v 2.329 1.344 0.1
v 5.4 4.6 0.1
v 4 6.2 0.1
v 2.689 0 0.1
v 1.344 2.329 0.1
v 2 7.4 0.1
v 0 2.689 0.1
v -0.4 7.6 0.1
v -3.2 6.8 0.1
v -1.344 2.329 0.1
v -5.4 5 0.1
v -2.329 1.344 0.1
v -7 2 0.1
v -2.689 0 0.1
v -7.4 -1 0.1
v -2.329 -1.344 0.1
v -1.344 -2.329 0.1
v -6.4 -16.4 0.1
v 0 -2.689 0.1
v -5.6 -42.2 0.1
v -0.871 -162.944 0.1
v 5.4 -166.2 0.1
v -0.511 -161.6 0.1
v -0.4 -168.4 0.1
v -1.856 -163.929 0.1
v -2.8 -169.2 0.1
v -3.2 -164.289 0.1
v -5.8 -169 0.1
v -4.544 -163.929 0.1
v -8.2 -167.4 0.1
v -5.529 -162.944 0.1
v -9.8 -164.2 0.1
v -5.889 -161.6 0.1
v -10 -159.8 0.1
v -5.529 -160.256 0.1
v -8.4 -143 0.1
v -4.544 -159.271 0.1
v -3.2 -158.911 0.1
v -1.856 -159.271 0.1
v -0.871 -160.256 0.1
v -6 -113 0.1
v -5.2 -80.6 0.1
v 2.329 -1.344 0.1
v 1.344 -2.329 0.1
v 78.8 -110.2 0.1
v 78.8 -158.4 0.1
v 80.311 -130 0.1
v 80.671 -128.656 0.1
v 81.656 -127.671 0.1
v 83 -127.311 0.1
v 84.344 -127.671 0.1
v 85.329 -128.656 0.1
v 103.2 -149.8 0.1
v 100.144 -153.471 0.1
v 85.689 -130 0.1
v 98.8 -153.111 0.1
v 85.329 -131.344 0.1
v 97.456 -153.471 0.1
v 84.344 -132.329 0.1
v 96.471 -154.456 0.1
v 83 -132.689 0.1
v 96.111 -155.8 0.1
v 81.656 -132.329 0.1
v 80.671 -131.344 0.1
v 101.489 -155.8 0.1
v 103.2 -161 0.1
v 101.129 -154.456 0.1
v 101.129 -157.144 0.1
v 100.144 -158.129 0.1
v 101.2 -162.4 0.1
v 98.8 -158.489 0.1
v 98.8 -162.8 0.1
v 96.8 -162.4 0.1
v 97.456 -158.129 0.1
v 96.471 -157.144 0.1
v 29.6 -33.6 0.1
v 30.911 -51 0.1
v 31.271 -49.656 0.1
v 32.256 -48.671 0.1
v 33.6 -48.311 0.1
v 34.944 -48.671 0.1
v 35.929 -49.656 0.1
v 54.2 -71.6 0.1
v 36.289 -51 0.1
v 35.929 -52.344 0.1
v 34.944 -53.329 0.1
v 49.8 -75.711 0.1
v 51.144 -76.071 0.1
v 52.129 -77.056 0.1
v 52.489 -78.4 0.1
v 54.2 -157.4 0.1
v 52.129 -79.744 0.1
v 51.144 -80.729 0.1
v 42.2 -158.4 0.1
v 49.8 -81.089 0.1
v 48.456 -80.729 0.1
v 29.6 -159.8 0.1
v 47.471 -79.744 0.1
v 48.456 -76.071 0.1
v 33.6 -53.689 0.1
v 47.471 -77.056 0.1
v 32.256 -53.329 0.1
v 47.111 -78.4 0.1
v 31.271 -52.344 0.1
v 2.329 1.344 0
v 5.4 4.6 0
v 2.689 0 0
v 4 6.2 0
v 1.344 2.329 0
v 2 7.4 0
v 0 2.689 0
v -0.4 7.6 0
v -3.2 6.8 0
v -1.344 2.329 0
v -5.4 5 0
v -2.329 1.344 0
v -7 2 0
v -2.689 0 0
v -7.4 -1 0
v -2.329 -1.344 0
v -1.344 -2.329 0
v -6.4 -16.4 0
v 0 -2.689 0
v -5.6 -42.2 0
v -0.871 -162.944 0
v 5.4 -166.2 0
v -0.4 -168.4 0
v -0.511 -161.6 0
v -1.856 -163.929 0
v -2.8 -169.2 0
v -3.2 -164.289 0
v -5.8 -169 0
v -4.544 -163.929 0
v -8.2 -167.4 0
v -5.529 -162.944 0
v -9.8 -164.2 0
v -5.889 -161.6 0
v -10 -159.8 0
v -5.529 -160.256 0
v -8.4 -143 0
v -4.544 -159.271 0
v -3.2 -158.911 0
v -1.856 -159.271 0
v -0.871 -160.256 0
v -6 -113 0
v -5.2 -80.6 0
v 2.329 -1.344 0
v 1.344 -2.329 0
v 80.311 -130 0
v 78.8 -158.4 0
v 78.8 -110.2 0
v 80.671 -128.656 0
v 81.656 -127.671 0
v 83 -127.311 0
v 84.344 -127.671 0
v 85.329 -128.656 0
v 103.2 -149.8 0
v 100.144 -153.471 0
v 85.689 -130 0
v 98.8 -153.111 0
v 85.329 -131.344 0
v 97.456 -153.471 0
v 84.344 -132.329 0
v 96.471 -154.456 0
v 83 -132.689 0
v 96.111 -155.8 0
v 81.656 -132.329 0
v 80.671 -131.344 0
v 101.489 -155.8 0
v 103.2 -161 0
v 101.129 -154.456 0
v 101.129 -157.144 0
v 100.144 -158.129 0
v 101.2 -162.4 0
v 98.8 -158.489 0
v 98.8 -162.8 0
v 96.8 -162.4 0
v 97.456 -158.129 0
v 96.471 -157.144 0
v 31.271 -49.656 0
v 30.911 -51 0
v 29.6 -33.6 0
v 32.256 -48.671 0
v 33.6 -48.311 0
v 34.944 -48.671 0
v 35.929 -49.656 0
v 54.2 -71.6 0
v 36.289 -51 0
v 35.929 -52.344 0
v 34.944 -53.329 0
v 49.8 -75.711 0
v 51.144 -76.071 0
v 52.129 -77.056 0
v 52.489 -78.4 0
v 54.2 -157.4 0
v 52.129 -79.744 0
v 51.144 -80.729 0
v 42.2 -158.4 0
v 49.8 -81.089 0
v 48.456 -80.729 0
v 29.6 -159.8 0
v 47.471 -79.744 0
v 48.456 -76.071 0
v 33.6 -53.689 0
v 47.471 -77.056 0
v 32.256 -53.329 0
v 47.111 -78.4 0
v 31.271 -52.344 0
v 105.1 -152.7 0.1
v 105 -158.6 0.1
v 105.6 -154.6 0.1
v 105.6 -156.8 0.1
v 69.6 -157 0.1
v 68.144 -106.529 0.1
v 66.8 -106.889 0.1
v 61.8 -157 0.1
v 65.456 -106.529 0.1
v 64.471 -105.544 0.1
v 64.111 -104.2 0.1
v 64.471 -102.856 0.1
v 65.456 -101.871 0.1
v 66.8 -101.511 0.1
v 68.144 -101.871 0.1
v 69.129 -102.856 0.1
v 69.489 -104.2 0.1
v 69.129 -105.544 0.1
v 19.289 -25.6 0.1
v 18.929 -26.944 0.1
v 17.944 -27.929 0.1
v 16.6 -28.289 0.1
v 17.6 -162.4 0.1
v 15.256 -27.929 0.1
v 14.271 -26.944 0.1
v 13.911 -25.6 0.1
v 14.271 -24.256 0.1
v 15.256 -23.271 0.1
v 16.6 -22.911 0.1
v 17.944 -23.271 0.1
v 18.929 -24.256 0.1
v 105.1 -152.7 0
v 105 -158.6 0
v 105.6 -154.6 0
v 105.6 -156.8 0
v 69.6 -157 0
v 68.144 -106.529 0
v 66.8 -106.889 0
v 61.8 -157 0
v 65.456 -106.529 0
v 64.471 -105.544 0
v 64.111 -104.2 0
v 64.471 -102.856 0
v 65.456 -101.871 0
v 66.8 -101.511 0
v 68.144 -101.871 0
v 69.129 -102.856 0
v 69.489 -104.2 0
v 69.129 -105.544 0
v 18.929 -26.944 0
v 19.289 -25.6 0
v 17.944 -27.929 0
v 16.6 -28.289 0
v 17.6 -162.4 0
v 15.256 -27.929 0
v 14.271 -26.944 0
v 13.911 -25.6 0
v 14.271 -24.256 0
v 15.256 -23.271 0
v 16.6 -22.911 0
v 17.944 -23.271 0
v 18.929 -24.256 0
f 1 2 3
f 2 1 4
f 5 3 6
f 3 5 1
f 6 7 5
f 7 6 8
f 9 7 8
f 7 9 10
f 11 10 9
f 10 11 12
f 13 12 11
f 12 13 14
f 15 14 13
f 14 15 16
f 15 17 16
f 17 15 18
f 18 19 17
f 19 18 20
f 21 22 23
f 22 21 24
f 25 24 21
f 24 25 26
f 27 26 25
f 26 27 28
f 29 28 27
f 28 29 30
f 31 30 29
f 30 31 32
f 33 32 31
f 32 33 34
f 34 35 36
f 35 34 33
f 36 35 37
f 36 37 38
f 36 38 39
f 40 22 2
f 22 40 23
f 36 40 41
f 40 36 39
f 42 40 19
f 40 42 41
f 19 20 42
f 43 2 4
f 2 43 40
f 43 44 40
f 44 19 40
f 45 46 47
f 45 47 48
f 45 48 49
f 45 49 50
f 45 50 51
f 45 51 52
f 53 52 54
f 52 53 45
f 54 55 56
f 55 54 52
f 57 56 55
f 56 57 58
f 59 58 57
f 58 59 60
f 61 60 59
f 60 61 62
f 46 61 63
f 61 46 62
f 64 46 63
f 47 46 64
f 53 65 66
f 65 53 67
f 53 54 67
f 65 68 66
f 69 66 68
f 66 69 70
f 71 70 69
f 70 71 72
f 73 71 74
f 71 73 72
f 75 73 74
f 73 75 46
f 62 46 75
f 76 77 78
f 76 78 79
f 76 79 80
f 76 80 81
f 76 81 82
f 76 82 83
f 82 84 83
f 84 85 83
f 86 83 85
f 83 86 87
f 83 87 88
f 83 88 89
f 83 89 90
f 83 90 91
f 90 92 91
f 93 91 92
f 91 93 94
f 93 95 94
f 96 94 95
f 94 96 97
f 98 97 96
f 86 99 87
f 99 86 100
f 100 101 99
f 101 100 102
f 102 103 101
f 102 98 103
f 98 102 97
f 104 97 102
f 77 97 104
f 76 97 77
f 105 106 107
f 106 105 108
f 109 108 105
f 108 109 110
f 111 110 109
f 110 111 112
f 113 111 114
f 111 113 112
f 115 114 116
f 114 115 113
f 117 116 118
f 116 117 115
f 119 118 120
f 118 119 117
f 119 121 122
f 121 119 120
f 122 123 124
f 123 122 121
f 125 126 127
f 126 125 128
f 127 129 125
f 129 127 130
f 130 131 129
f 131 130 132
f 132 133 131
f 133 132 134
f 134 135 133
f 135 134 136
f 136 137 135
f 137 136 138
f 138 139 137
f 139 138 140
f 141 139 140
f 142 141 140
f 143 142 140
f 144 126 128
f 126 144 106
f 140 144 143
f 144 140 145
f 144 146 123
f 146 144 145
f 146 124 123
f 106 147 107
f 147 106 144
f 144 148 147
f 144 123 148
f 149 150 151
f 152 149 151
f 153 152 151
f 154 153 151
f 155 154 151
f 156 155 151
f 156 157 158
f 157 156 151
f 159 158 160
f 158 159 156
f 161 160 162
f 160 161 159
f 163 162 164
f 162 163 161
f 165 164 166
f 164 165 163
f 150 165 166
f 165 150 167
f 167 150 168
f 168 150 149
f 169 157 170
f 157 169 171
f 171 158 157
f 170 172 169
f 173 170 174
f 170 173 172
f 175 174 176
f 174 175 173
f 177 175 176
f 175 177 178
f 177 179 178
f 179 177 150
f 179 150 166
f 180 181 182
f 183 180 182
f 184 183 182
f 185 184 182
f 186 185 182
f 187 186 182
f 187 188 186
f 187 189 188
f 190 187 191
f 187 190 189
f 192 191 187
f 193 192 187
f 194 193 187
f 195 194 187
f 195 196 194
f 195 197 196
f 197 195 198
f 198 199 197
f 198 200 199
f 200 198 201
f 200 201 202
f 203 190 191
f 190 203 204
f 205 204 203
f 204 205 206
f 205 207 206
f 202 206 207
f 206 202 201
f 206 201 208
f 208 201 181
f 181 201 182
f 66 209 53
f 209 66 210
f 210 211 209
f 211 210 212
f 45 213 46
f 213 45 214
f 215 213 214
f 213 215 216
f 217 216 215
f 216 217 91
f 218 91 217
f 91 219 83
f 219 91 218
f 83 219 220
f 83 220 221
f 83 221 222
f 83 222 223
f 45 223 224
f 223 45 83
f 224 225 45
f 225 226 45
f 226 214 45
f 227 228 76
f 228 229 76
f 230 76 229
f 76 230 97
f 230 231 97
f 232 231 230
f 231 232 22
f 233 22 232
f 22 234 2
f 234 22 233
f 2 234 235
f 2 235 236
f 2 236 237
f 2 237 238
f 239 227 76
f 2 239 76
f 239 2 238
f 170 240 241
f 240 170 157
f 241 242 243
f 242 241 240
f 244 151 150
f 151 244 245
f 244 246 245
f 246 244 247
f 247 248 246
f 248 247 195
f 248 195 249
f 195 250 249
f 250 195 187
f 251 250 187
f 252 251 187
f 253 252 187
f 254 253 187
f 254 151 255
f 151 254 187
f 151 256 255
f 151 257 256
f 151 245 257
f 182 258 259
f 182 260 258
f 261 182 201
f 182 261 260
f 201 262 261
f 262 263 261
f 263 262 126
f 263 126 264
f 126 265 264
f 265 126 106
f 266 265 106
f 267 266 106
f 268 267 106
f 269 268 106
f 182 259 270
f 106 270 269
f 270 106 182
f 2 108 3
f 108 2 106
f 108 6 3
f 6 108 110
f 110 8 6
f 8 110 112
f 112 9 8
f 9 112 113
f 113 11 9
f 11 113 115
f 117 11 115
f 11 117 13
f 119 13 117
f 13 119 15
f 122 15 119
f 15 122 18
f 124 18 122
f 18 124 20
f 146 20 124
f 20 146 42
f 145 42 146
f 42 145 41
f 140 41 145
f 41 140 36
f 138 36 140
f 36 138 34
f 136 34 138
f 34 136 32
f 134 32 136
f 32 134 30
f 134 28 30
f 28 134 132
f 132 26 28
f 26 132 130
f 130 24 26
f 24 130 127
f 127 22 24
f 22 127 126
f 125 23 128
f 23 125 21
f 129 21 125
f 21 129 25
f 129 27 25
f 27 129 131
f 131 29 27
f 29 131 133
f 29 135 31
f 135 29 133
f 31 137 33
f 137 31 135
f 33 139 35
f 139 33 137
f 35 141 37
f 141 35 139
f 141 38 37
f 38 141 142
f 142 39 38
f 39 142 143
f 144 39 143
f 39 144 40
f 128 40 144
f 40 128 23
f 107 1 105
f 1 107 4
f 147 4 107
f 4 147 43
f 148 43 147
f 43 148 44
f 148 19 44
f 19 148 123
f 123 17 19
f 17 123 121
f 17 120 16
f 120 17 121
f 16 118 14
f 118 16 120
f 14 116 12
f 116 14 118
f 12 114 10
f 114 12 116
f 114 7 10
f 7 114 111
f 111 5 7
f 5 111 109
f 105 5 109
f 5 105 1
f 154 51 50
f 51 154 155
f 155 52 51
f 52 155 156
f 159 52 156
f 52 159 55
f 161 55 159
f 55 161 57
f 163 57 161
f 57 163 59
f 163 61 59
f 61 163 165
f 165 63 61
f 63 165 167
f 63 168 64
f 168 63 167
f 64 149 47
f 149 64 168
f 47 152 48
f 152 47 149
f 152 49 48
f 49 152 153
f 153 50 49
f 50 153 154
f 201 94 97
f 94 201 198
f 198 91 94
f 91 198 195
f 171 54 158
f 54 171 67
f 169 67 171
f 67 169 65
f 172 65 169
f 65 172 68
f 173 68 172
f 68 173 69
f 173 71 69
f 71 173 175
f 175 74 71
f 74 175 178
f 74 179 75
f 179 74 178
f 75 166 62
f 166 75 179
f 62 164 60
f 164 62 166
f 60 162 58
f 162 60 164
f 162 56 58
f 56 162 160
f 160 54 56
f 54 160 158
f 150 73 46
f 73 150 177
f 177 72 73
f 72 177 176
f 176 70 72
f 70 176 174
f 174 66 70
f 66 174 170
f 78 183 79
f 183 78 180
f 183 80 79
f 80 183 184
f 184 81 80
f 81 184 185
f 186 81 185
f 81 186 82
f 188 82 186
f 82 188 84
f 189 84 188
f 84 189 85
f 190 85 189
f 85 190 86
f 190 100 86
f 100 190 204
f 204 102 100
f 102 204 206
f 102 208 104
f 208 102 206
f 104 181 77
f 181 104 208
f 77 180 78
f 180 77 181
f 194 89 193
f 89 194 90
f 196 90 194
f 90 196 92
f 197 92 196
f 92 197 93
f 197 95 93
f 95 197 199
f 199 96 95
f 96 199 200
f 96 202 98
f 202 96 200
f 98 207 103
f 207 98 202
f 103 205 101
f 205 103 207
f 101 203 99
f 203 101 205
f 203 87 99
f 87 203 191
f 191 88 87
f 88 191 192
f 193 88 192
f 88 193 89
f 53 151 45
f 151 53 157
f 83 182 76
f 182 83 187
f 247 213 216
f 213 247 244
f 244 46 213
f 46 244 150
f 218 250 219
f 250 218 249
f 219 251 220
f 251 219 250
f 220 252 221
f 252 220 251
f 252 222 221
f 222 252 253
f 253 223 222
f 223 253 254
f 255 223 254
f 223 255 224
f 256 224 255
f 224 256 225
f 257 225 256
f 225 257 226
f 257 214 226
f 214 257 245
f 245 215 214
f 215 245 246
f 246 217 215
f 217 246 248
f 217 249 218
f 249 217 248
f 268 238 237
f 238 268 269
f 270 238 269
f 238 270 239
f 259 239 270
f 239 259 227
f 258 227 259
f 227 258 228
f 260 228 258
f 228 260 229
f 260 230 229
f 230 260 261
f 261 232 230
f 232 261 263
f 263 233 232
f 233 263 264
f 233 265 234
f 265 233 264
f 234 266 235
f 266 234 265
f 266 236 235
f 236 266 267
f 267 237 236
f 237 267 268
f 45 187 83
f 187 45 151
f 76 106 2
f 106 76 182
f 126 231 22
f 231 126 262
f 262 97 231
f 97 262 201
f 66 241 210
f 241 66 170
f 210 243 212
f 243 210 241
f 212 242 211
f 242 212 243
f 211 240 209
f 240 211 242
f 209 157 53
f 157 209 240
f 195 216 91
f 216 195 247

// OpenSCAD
use <../lib.scad>
use <s/u9496s01.scad>
use <s/u9496s02.scad>
use <s/u9496s03.scad>
use <s/u9496s04.scad>
function ldraw_lib__u9496p01() = [
// 0 Sheet Fabric 15 x 22 Triangular Sail with Thick Stripes on White Background Pattern
// 0 Name: u9496p01.dat
// 0 Author: Philippe Hurbain [Philo]
// 0 !LDRAW_ORG Part UPDATE 2022-03
// 0 !LICENSE Licensed under CC BY 2.0 and CC BY 4.0 : see CAreadme.txt
// 
// 0 BFC CERTIFY CCW
  [0,"BFC","CERTIFY"],
  [0,"BFC","CCW"],
// 
// 0 !CATEGORY Sheet Fabric
// 0 !KEYWORDS Black Seas Barracuda, Caribbean Clipper, set 10040, Set 6274
// 0 !KEYWORDS set 6285, set 6286, Skull's Eye Schooner
// 
// 0 !HISTORY 2022-05-07 [PTadmin] Official Update 2022-03
// 
// 
// 1 16 0 -0.25 0 1 0 0 0 1 0 0 0 1 s\u9496s01.dat
  [1,16,0,-0.25,0,1,0,0,0,1,0,0,0,1, ldraw_lib__s__u9496s01()],
// 1 16 0 0 0 1 0 0 0 -1 0 0 0 1 s\u9496s01.dat
  [1,16,0,0,0,1,0,0,0,-1,0,0,0,1, ldraw_lib__s__u9496s01()],
// 
// 1 15 0 -.25 0 1 0 0 0 1 0 0 0 1 s\u9496s02.dat
  [1,15,0,-.25,0,1,0,0,0,1,0,0,0,1, ldraw_lib__s__u9496s02()],
// 1 15 0 0 0 1 0 0 0 -1 0 0 0 1 s\u9496s02.dat
  [1,15,0,0,0,1,0,0,0,-1,0,0,0,1, ldraw_lib__s__u9496s02()],
// 
// 1 16 0 0 0 1 0 0 0 1 0 0 0 1 s\u9496s03.dat
  [1,16,0,0,0,1,0,0,0,1,0,0,0,1, ldraw_lib__s__u9496s03()],
// 
// 1 15 0 0 0 1 0 0 0 1 0 0 0 1 s\u9496s04.dat
  [1,15,0,0,0,1,0,0,0,1,0,0,0,1, ldraw_lib__s__u9496s04()],
];
module ldraw_lib__u9496p01(step=0, col=false, unit=2/5, alt=false, line=0.2, solid=!$preview)
    makepoly(ldraw_lib__u9496p01(), step=step, col=col, unit=unit, alt=alt, line=line, solid=solid);
ldraw_lib__u9496p01(line=0.2);
